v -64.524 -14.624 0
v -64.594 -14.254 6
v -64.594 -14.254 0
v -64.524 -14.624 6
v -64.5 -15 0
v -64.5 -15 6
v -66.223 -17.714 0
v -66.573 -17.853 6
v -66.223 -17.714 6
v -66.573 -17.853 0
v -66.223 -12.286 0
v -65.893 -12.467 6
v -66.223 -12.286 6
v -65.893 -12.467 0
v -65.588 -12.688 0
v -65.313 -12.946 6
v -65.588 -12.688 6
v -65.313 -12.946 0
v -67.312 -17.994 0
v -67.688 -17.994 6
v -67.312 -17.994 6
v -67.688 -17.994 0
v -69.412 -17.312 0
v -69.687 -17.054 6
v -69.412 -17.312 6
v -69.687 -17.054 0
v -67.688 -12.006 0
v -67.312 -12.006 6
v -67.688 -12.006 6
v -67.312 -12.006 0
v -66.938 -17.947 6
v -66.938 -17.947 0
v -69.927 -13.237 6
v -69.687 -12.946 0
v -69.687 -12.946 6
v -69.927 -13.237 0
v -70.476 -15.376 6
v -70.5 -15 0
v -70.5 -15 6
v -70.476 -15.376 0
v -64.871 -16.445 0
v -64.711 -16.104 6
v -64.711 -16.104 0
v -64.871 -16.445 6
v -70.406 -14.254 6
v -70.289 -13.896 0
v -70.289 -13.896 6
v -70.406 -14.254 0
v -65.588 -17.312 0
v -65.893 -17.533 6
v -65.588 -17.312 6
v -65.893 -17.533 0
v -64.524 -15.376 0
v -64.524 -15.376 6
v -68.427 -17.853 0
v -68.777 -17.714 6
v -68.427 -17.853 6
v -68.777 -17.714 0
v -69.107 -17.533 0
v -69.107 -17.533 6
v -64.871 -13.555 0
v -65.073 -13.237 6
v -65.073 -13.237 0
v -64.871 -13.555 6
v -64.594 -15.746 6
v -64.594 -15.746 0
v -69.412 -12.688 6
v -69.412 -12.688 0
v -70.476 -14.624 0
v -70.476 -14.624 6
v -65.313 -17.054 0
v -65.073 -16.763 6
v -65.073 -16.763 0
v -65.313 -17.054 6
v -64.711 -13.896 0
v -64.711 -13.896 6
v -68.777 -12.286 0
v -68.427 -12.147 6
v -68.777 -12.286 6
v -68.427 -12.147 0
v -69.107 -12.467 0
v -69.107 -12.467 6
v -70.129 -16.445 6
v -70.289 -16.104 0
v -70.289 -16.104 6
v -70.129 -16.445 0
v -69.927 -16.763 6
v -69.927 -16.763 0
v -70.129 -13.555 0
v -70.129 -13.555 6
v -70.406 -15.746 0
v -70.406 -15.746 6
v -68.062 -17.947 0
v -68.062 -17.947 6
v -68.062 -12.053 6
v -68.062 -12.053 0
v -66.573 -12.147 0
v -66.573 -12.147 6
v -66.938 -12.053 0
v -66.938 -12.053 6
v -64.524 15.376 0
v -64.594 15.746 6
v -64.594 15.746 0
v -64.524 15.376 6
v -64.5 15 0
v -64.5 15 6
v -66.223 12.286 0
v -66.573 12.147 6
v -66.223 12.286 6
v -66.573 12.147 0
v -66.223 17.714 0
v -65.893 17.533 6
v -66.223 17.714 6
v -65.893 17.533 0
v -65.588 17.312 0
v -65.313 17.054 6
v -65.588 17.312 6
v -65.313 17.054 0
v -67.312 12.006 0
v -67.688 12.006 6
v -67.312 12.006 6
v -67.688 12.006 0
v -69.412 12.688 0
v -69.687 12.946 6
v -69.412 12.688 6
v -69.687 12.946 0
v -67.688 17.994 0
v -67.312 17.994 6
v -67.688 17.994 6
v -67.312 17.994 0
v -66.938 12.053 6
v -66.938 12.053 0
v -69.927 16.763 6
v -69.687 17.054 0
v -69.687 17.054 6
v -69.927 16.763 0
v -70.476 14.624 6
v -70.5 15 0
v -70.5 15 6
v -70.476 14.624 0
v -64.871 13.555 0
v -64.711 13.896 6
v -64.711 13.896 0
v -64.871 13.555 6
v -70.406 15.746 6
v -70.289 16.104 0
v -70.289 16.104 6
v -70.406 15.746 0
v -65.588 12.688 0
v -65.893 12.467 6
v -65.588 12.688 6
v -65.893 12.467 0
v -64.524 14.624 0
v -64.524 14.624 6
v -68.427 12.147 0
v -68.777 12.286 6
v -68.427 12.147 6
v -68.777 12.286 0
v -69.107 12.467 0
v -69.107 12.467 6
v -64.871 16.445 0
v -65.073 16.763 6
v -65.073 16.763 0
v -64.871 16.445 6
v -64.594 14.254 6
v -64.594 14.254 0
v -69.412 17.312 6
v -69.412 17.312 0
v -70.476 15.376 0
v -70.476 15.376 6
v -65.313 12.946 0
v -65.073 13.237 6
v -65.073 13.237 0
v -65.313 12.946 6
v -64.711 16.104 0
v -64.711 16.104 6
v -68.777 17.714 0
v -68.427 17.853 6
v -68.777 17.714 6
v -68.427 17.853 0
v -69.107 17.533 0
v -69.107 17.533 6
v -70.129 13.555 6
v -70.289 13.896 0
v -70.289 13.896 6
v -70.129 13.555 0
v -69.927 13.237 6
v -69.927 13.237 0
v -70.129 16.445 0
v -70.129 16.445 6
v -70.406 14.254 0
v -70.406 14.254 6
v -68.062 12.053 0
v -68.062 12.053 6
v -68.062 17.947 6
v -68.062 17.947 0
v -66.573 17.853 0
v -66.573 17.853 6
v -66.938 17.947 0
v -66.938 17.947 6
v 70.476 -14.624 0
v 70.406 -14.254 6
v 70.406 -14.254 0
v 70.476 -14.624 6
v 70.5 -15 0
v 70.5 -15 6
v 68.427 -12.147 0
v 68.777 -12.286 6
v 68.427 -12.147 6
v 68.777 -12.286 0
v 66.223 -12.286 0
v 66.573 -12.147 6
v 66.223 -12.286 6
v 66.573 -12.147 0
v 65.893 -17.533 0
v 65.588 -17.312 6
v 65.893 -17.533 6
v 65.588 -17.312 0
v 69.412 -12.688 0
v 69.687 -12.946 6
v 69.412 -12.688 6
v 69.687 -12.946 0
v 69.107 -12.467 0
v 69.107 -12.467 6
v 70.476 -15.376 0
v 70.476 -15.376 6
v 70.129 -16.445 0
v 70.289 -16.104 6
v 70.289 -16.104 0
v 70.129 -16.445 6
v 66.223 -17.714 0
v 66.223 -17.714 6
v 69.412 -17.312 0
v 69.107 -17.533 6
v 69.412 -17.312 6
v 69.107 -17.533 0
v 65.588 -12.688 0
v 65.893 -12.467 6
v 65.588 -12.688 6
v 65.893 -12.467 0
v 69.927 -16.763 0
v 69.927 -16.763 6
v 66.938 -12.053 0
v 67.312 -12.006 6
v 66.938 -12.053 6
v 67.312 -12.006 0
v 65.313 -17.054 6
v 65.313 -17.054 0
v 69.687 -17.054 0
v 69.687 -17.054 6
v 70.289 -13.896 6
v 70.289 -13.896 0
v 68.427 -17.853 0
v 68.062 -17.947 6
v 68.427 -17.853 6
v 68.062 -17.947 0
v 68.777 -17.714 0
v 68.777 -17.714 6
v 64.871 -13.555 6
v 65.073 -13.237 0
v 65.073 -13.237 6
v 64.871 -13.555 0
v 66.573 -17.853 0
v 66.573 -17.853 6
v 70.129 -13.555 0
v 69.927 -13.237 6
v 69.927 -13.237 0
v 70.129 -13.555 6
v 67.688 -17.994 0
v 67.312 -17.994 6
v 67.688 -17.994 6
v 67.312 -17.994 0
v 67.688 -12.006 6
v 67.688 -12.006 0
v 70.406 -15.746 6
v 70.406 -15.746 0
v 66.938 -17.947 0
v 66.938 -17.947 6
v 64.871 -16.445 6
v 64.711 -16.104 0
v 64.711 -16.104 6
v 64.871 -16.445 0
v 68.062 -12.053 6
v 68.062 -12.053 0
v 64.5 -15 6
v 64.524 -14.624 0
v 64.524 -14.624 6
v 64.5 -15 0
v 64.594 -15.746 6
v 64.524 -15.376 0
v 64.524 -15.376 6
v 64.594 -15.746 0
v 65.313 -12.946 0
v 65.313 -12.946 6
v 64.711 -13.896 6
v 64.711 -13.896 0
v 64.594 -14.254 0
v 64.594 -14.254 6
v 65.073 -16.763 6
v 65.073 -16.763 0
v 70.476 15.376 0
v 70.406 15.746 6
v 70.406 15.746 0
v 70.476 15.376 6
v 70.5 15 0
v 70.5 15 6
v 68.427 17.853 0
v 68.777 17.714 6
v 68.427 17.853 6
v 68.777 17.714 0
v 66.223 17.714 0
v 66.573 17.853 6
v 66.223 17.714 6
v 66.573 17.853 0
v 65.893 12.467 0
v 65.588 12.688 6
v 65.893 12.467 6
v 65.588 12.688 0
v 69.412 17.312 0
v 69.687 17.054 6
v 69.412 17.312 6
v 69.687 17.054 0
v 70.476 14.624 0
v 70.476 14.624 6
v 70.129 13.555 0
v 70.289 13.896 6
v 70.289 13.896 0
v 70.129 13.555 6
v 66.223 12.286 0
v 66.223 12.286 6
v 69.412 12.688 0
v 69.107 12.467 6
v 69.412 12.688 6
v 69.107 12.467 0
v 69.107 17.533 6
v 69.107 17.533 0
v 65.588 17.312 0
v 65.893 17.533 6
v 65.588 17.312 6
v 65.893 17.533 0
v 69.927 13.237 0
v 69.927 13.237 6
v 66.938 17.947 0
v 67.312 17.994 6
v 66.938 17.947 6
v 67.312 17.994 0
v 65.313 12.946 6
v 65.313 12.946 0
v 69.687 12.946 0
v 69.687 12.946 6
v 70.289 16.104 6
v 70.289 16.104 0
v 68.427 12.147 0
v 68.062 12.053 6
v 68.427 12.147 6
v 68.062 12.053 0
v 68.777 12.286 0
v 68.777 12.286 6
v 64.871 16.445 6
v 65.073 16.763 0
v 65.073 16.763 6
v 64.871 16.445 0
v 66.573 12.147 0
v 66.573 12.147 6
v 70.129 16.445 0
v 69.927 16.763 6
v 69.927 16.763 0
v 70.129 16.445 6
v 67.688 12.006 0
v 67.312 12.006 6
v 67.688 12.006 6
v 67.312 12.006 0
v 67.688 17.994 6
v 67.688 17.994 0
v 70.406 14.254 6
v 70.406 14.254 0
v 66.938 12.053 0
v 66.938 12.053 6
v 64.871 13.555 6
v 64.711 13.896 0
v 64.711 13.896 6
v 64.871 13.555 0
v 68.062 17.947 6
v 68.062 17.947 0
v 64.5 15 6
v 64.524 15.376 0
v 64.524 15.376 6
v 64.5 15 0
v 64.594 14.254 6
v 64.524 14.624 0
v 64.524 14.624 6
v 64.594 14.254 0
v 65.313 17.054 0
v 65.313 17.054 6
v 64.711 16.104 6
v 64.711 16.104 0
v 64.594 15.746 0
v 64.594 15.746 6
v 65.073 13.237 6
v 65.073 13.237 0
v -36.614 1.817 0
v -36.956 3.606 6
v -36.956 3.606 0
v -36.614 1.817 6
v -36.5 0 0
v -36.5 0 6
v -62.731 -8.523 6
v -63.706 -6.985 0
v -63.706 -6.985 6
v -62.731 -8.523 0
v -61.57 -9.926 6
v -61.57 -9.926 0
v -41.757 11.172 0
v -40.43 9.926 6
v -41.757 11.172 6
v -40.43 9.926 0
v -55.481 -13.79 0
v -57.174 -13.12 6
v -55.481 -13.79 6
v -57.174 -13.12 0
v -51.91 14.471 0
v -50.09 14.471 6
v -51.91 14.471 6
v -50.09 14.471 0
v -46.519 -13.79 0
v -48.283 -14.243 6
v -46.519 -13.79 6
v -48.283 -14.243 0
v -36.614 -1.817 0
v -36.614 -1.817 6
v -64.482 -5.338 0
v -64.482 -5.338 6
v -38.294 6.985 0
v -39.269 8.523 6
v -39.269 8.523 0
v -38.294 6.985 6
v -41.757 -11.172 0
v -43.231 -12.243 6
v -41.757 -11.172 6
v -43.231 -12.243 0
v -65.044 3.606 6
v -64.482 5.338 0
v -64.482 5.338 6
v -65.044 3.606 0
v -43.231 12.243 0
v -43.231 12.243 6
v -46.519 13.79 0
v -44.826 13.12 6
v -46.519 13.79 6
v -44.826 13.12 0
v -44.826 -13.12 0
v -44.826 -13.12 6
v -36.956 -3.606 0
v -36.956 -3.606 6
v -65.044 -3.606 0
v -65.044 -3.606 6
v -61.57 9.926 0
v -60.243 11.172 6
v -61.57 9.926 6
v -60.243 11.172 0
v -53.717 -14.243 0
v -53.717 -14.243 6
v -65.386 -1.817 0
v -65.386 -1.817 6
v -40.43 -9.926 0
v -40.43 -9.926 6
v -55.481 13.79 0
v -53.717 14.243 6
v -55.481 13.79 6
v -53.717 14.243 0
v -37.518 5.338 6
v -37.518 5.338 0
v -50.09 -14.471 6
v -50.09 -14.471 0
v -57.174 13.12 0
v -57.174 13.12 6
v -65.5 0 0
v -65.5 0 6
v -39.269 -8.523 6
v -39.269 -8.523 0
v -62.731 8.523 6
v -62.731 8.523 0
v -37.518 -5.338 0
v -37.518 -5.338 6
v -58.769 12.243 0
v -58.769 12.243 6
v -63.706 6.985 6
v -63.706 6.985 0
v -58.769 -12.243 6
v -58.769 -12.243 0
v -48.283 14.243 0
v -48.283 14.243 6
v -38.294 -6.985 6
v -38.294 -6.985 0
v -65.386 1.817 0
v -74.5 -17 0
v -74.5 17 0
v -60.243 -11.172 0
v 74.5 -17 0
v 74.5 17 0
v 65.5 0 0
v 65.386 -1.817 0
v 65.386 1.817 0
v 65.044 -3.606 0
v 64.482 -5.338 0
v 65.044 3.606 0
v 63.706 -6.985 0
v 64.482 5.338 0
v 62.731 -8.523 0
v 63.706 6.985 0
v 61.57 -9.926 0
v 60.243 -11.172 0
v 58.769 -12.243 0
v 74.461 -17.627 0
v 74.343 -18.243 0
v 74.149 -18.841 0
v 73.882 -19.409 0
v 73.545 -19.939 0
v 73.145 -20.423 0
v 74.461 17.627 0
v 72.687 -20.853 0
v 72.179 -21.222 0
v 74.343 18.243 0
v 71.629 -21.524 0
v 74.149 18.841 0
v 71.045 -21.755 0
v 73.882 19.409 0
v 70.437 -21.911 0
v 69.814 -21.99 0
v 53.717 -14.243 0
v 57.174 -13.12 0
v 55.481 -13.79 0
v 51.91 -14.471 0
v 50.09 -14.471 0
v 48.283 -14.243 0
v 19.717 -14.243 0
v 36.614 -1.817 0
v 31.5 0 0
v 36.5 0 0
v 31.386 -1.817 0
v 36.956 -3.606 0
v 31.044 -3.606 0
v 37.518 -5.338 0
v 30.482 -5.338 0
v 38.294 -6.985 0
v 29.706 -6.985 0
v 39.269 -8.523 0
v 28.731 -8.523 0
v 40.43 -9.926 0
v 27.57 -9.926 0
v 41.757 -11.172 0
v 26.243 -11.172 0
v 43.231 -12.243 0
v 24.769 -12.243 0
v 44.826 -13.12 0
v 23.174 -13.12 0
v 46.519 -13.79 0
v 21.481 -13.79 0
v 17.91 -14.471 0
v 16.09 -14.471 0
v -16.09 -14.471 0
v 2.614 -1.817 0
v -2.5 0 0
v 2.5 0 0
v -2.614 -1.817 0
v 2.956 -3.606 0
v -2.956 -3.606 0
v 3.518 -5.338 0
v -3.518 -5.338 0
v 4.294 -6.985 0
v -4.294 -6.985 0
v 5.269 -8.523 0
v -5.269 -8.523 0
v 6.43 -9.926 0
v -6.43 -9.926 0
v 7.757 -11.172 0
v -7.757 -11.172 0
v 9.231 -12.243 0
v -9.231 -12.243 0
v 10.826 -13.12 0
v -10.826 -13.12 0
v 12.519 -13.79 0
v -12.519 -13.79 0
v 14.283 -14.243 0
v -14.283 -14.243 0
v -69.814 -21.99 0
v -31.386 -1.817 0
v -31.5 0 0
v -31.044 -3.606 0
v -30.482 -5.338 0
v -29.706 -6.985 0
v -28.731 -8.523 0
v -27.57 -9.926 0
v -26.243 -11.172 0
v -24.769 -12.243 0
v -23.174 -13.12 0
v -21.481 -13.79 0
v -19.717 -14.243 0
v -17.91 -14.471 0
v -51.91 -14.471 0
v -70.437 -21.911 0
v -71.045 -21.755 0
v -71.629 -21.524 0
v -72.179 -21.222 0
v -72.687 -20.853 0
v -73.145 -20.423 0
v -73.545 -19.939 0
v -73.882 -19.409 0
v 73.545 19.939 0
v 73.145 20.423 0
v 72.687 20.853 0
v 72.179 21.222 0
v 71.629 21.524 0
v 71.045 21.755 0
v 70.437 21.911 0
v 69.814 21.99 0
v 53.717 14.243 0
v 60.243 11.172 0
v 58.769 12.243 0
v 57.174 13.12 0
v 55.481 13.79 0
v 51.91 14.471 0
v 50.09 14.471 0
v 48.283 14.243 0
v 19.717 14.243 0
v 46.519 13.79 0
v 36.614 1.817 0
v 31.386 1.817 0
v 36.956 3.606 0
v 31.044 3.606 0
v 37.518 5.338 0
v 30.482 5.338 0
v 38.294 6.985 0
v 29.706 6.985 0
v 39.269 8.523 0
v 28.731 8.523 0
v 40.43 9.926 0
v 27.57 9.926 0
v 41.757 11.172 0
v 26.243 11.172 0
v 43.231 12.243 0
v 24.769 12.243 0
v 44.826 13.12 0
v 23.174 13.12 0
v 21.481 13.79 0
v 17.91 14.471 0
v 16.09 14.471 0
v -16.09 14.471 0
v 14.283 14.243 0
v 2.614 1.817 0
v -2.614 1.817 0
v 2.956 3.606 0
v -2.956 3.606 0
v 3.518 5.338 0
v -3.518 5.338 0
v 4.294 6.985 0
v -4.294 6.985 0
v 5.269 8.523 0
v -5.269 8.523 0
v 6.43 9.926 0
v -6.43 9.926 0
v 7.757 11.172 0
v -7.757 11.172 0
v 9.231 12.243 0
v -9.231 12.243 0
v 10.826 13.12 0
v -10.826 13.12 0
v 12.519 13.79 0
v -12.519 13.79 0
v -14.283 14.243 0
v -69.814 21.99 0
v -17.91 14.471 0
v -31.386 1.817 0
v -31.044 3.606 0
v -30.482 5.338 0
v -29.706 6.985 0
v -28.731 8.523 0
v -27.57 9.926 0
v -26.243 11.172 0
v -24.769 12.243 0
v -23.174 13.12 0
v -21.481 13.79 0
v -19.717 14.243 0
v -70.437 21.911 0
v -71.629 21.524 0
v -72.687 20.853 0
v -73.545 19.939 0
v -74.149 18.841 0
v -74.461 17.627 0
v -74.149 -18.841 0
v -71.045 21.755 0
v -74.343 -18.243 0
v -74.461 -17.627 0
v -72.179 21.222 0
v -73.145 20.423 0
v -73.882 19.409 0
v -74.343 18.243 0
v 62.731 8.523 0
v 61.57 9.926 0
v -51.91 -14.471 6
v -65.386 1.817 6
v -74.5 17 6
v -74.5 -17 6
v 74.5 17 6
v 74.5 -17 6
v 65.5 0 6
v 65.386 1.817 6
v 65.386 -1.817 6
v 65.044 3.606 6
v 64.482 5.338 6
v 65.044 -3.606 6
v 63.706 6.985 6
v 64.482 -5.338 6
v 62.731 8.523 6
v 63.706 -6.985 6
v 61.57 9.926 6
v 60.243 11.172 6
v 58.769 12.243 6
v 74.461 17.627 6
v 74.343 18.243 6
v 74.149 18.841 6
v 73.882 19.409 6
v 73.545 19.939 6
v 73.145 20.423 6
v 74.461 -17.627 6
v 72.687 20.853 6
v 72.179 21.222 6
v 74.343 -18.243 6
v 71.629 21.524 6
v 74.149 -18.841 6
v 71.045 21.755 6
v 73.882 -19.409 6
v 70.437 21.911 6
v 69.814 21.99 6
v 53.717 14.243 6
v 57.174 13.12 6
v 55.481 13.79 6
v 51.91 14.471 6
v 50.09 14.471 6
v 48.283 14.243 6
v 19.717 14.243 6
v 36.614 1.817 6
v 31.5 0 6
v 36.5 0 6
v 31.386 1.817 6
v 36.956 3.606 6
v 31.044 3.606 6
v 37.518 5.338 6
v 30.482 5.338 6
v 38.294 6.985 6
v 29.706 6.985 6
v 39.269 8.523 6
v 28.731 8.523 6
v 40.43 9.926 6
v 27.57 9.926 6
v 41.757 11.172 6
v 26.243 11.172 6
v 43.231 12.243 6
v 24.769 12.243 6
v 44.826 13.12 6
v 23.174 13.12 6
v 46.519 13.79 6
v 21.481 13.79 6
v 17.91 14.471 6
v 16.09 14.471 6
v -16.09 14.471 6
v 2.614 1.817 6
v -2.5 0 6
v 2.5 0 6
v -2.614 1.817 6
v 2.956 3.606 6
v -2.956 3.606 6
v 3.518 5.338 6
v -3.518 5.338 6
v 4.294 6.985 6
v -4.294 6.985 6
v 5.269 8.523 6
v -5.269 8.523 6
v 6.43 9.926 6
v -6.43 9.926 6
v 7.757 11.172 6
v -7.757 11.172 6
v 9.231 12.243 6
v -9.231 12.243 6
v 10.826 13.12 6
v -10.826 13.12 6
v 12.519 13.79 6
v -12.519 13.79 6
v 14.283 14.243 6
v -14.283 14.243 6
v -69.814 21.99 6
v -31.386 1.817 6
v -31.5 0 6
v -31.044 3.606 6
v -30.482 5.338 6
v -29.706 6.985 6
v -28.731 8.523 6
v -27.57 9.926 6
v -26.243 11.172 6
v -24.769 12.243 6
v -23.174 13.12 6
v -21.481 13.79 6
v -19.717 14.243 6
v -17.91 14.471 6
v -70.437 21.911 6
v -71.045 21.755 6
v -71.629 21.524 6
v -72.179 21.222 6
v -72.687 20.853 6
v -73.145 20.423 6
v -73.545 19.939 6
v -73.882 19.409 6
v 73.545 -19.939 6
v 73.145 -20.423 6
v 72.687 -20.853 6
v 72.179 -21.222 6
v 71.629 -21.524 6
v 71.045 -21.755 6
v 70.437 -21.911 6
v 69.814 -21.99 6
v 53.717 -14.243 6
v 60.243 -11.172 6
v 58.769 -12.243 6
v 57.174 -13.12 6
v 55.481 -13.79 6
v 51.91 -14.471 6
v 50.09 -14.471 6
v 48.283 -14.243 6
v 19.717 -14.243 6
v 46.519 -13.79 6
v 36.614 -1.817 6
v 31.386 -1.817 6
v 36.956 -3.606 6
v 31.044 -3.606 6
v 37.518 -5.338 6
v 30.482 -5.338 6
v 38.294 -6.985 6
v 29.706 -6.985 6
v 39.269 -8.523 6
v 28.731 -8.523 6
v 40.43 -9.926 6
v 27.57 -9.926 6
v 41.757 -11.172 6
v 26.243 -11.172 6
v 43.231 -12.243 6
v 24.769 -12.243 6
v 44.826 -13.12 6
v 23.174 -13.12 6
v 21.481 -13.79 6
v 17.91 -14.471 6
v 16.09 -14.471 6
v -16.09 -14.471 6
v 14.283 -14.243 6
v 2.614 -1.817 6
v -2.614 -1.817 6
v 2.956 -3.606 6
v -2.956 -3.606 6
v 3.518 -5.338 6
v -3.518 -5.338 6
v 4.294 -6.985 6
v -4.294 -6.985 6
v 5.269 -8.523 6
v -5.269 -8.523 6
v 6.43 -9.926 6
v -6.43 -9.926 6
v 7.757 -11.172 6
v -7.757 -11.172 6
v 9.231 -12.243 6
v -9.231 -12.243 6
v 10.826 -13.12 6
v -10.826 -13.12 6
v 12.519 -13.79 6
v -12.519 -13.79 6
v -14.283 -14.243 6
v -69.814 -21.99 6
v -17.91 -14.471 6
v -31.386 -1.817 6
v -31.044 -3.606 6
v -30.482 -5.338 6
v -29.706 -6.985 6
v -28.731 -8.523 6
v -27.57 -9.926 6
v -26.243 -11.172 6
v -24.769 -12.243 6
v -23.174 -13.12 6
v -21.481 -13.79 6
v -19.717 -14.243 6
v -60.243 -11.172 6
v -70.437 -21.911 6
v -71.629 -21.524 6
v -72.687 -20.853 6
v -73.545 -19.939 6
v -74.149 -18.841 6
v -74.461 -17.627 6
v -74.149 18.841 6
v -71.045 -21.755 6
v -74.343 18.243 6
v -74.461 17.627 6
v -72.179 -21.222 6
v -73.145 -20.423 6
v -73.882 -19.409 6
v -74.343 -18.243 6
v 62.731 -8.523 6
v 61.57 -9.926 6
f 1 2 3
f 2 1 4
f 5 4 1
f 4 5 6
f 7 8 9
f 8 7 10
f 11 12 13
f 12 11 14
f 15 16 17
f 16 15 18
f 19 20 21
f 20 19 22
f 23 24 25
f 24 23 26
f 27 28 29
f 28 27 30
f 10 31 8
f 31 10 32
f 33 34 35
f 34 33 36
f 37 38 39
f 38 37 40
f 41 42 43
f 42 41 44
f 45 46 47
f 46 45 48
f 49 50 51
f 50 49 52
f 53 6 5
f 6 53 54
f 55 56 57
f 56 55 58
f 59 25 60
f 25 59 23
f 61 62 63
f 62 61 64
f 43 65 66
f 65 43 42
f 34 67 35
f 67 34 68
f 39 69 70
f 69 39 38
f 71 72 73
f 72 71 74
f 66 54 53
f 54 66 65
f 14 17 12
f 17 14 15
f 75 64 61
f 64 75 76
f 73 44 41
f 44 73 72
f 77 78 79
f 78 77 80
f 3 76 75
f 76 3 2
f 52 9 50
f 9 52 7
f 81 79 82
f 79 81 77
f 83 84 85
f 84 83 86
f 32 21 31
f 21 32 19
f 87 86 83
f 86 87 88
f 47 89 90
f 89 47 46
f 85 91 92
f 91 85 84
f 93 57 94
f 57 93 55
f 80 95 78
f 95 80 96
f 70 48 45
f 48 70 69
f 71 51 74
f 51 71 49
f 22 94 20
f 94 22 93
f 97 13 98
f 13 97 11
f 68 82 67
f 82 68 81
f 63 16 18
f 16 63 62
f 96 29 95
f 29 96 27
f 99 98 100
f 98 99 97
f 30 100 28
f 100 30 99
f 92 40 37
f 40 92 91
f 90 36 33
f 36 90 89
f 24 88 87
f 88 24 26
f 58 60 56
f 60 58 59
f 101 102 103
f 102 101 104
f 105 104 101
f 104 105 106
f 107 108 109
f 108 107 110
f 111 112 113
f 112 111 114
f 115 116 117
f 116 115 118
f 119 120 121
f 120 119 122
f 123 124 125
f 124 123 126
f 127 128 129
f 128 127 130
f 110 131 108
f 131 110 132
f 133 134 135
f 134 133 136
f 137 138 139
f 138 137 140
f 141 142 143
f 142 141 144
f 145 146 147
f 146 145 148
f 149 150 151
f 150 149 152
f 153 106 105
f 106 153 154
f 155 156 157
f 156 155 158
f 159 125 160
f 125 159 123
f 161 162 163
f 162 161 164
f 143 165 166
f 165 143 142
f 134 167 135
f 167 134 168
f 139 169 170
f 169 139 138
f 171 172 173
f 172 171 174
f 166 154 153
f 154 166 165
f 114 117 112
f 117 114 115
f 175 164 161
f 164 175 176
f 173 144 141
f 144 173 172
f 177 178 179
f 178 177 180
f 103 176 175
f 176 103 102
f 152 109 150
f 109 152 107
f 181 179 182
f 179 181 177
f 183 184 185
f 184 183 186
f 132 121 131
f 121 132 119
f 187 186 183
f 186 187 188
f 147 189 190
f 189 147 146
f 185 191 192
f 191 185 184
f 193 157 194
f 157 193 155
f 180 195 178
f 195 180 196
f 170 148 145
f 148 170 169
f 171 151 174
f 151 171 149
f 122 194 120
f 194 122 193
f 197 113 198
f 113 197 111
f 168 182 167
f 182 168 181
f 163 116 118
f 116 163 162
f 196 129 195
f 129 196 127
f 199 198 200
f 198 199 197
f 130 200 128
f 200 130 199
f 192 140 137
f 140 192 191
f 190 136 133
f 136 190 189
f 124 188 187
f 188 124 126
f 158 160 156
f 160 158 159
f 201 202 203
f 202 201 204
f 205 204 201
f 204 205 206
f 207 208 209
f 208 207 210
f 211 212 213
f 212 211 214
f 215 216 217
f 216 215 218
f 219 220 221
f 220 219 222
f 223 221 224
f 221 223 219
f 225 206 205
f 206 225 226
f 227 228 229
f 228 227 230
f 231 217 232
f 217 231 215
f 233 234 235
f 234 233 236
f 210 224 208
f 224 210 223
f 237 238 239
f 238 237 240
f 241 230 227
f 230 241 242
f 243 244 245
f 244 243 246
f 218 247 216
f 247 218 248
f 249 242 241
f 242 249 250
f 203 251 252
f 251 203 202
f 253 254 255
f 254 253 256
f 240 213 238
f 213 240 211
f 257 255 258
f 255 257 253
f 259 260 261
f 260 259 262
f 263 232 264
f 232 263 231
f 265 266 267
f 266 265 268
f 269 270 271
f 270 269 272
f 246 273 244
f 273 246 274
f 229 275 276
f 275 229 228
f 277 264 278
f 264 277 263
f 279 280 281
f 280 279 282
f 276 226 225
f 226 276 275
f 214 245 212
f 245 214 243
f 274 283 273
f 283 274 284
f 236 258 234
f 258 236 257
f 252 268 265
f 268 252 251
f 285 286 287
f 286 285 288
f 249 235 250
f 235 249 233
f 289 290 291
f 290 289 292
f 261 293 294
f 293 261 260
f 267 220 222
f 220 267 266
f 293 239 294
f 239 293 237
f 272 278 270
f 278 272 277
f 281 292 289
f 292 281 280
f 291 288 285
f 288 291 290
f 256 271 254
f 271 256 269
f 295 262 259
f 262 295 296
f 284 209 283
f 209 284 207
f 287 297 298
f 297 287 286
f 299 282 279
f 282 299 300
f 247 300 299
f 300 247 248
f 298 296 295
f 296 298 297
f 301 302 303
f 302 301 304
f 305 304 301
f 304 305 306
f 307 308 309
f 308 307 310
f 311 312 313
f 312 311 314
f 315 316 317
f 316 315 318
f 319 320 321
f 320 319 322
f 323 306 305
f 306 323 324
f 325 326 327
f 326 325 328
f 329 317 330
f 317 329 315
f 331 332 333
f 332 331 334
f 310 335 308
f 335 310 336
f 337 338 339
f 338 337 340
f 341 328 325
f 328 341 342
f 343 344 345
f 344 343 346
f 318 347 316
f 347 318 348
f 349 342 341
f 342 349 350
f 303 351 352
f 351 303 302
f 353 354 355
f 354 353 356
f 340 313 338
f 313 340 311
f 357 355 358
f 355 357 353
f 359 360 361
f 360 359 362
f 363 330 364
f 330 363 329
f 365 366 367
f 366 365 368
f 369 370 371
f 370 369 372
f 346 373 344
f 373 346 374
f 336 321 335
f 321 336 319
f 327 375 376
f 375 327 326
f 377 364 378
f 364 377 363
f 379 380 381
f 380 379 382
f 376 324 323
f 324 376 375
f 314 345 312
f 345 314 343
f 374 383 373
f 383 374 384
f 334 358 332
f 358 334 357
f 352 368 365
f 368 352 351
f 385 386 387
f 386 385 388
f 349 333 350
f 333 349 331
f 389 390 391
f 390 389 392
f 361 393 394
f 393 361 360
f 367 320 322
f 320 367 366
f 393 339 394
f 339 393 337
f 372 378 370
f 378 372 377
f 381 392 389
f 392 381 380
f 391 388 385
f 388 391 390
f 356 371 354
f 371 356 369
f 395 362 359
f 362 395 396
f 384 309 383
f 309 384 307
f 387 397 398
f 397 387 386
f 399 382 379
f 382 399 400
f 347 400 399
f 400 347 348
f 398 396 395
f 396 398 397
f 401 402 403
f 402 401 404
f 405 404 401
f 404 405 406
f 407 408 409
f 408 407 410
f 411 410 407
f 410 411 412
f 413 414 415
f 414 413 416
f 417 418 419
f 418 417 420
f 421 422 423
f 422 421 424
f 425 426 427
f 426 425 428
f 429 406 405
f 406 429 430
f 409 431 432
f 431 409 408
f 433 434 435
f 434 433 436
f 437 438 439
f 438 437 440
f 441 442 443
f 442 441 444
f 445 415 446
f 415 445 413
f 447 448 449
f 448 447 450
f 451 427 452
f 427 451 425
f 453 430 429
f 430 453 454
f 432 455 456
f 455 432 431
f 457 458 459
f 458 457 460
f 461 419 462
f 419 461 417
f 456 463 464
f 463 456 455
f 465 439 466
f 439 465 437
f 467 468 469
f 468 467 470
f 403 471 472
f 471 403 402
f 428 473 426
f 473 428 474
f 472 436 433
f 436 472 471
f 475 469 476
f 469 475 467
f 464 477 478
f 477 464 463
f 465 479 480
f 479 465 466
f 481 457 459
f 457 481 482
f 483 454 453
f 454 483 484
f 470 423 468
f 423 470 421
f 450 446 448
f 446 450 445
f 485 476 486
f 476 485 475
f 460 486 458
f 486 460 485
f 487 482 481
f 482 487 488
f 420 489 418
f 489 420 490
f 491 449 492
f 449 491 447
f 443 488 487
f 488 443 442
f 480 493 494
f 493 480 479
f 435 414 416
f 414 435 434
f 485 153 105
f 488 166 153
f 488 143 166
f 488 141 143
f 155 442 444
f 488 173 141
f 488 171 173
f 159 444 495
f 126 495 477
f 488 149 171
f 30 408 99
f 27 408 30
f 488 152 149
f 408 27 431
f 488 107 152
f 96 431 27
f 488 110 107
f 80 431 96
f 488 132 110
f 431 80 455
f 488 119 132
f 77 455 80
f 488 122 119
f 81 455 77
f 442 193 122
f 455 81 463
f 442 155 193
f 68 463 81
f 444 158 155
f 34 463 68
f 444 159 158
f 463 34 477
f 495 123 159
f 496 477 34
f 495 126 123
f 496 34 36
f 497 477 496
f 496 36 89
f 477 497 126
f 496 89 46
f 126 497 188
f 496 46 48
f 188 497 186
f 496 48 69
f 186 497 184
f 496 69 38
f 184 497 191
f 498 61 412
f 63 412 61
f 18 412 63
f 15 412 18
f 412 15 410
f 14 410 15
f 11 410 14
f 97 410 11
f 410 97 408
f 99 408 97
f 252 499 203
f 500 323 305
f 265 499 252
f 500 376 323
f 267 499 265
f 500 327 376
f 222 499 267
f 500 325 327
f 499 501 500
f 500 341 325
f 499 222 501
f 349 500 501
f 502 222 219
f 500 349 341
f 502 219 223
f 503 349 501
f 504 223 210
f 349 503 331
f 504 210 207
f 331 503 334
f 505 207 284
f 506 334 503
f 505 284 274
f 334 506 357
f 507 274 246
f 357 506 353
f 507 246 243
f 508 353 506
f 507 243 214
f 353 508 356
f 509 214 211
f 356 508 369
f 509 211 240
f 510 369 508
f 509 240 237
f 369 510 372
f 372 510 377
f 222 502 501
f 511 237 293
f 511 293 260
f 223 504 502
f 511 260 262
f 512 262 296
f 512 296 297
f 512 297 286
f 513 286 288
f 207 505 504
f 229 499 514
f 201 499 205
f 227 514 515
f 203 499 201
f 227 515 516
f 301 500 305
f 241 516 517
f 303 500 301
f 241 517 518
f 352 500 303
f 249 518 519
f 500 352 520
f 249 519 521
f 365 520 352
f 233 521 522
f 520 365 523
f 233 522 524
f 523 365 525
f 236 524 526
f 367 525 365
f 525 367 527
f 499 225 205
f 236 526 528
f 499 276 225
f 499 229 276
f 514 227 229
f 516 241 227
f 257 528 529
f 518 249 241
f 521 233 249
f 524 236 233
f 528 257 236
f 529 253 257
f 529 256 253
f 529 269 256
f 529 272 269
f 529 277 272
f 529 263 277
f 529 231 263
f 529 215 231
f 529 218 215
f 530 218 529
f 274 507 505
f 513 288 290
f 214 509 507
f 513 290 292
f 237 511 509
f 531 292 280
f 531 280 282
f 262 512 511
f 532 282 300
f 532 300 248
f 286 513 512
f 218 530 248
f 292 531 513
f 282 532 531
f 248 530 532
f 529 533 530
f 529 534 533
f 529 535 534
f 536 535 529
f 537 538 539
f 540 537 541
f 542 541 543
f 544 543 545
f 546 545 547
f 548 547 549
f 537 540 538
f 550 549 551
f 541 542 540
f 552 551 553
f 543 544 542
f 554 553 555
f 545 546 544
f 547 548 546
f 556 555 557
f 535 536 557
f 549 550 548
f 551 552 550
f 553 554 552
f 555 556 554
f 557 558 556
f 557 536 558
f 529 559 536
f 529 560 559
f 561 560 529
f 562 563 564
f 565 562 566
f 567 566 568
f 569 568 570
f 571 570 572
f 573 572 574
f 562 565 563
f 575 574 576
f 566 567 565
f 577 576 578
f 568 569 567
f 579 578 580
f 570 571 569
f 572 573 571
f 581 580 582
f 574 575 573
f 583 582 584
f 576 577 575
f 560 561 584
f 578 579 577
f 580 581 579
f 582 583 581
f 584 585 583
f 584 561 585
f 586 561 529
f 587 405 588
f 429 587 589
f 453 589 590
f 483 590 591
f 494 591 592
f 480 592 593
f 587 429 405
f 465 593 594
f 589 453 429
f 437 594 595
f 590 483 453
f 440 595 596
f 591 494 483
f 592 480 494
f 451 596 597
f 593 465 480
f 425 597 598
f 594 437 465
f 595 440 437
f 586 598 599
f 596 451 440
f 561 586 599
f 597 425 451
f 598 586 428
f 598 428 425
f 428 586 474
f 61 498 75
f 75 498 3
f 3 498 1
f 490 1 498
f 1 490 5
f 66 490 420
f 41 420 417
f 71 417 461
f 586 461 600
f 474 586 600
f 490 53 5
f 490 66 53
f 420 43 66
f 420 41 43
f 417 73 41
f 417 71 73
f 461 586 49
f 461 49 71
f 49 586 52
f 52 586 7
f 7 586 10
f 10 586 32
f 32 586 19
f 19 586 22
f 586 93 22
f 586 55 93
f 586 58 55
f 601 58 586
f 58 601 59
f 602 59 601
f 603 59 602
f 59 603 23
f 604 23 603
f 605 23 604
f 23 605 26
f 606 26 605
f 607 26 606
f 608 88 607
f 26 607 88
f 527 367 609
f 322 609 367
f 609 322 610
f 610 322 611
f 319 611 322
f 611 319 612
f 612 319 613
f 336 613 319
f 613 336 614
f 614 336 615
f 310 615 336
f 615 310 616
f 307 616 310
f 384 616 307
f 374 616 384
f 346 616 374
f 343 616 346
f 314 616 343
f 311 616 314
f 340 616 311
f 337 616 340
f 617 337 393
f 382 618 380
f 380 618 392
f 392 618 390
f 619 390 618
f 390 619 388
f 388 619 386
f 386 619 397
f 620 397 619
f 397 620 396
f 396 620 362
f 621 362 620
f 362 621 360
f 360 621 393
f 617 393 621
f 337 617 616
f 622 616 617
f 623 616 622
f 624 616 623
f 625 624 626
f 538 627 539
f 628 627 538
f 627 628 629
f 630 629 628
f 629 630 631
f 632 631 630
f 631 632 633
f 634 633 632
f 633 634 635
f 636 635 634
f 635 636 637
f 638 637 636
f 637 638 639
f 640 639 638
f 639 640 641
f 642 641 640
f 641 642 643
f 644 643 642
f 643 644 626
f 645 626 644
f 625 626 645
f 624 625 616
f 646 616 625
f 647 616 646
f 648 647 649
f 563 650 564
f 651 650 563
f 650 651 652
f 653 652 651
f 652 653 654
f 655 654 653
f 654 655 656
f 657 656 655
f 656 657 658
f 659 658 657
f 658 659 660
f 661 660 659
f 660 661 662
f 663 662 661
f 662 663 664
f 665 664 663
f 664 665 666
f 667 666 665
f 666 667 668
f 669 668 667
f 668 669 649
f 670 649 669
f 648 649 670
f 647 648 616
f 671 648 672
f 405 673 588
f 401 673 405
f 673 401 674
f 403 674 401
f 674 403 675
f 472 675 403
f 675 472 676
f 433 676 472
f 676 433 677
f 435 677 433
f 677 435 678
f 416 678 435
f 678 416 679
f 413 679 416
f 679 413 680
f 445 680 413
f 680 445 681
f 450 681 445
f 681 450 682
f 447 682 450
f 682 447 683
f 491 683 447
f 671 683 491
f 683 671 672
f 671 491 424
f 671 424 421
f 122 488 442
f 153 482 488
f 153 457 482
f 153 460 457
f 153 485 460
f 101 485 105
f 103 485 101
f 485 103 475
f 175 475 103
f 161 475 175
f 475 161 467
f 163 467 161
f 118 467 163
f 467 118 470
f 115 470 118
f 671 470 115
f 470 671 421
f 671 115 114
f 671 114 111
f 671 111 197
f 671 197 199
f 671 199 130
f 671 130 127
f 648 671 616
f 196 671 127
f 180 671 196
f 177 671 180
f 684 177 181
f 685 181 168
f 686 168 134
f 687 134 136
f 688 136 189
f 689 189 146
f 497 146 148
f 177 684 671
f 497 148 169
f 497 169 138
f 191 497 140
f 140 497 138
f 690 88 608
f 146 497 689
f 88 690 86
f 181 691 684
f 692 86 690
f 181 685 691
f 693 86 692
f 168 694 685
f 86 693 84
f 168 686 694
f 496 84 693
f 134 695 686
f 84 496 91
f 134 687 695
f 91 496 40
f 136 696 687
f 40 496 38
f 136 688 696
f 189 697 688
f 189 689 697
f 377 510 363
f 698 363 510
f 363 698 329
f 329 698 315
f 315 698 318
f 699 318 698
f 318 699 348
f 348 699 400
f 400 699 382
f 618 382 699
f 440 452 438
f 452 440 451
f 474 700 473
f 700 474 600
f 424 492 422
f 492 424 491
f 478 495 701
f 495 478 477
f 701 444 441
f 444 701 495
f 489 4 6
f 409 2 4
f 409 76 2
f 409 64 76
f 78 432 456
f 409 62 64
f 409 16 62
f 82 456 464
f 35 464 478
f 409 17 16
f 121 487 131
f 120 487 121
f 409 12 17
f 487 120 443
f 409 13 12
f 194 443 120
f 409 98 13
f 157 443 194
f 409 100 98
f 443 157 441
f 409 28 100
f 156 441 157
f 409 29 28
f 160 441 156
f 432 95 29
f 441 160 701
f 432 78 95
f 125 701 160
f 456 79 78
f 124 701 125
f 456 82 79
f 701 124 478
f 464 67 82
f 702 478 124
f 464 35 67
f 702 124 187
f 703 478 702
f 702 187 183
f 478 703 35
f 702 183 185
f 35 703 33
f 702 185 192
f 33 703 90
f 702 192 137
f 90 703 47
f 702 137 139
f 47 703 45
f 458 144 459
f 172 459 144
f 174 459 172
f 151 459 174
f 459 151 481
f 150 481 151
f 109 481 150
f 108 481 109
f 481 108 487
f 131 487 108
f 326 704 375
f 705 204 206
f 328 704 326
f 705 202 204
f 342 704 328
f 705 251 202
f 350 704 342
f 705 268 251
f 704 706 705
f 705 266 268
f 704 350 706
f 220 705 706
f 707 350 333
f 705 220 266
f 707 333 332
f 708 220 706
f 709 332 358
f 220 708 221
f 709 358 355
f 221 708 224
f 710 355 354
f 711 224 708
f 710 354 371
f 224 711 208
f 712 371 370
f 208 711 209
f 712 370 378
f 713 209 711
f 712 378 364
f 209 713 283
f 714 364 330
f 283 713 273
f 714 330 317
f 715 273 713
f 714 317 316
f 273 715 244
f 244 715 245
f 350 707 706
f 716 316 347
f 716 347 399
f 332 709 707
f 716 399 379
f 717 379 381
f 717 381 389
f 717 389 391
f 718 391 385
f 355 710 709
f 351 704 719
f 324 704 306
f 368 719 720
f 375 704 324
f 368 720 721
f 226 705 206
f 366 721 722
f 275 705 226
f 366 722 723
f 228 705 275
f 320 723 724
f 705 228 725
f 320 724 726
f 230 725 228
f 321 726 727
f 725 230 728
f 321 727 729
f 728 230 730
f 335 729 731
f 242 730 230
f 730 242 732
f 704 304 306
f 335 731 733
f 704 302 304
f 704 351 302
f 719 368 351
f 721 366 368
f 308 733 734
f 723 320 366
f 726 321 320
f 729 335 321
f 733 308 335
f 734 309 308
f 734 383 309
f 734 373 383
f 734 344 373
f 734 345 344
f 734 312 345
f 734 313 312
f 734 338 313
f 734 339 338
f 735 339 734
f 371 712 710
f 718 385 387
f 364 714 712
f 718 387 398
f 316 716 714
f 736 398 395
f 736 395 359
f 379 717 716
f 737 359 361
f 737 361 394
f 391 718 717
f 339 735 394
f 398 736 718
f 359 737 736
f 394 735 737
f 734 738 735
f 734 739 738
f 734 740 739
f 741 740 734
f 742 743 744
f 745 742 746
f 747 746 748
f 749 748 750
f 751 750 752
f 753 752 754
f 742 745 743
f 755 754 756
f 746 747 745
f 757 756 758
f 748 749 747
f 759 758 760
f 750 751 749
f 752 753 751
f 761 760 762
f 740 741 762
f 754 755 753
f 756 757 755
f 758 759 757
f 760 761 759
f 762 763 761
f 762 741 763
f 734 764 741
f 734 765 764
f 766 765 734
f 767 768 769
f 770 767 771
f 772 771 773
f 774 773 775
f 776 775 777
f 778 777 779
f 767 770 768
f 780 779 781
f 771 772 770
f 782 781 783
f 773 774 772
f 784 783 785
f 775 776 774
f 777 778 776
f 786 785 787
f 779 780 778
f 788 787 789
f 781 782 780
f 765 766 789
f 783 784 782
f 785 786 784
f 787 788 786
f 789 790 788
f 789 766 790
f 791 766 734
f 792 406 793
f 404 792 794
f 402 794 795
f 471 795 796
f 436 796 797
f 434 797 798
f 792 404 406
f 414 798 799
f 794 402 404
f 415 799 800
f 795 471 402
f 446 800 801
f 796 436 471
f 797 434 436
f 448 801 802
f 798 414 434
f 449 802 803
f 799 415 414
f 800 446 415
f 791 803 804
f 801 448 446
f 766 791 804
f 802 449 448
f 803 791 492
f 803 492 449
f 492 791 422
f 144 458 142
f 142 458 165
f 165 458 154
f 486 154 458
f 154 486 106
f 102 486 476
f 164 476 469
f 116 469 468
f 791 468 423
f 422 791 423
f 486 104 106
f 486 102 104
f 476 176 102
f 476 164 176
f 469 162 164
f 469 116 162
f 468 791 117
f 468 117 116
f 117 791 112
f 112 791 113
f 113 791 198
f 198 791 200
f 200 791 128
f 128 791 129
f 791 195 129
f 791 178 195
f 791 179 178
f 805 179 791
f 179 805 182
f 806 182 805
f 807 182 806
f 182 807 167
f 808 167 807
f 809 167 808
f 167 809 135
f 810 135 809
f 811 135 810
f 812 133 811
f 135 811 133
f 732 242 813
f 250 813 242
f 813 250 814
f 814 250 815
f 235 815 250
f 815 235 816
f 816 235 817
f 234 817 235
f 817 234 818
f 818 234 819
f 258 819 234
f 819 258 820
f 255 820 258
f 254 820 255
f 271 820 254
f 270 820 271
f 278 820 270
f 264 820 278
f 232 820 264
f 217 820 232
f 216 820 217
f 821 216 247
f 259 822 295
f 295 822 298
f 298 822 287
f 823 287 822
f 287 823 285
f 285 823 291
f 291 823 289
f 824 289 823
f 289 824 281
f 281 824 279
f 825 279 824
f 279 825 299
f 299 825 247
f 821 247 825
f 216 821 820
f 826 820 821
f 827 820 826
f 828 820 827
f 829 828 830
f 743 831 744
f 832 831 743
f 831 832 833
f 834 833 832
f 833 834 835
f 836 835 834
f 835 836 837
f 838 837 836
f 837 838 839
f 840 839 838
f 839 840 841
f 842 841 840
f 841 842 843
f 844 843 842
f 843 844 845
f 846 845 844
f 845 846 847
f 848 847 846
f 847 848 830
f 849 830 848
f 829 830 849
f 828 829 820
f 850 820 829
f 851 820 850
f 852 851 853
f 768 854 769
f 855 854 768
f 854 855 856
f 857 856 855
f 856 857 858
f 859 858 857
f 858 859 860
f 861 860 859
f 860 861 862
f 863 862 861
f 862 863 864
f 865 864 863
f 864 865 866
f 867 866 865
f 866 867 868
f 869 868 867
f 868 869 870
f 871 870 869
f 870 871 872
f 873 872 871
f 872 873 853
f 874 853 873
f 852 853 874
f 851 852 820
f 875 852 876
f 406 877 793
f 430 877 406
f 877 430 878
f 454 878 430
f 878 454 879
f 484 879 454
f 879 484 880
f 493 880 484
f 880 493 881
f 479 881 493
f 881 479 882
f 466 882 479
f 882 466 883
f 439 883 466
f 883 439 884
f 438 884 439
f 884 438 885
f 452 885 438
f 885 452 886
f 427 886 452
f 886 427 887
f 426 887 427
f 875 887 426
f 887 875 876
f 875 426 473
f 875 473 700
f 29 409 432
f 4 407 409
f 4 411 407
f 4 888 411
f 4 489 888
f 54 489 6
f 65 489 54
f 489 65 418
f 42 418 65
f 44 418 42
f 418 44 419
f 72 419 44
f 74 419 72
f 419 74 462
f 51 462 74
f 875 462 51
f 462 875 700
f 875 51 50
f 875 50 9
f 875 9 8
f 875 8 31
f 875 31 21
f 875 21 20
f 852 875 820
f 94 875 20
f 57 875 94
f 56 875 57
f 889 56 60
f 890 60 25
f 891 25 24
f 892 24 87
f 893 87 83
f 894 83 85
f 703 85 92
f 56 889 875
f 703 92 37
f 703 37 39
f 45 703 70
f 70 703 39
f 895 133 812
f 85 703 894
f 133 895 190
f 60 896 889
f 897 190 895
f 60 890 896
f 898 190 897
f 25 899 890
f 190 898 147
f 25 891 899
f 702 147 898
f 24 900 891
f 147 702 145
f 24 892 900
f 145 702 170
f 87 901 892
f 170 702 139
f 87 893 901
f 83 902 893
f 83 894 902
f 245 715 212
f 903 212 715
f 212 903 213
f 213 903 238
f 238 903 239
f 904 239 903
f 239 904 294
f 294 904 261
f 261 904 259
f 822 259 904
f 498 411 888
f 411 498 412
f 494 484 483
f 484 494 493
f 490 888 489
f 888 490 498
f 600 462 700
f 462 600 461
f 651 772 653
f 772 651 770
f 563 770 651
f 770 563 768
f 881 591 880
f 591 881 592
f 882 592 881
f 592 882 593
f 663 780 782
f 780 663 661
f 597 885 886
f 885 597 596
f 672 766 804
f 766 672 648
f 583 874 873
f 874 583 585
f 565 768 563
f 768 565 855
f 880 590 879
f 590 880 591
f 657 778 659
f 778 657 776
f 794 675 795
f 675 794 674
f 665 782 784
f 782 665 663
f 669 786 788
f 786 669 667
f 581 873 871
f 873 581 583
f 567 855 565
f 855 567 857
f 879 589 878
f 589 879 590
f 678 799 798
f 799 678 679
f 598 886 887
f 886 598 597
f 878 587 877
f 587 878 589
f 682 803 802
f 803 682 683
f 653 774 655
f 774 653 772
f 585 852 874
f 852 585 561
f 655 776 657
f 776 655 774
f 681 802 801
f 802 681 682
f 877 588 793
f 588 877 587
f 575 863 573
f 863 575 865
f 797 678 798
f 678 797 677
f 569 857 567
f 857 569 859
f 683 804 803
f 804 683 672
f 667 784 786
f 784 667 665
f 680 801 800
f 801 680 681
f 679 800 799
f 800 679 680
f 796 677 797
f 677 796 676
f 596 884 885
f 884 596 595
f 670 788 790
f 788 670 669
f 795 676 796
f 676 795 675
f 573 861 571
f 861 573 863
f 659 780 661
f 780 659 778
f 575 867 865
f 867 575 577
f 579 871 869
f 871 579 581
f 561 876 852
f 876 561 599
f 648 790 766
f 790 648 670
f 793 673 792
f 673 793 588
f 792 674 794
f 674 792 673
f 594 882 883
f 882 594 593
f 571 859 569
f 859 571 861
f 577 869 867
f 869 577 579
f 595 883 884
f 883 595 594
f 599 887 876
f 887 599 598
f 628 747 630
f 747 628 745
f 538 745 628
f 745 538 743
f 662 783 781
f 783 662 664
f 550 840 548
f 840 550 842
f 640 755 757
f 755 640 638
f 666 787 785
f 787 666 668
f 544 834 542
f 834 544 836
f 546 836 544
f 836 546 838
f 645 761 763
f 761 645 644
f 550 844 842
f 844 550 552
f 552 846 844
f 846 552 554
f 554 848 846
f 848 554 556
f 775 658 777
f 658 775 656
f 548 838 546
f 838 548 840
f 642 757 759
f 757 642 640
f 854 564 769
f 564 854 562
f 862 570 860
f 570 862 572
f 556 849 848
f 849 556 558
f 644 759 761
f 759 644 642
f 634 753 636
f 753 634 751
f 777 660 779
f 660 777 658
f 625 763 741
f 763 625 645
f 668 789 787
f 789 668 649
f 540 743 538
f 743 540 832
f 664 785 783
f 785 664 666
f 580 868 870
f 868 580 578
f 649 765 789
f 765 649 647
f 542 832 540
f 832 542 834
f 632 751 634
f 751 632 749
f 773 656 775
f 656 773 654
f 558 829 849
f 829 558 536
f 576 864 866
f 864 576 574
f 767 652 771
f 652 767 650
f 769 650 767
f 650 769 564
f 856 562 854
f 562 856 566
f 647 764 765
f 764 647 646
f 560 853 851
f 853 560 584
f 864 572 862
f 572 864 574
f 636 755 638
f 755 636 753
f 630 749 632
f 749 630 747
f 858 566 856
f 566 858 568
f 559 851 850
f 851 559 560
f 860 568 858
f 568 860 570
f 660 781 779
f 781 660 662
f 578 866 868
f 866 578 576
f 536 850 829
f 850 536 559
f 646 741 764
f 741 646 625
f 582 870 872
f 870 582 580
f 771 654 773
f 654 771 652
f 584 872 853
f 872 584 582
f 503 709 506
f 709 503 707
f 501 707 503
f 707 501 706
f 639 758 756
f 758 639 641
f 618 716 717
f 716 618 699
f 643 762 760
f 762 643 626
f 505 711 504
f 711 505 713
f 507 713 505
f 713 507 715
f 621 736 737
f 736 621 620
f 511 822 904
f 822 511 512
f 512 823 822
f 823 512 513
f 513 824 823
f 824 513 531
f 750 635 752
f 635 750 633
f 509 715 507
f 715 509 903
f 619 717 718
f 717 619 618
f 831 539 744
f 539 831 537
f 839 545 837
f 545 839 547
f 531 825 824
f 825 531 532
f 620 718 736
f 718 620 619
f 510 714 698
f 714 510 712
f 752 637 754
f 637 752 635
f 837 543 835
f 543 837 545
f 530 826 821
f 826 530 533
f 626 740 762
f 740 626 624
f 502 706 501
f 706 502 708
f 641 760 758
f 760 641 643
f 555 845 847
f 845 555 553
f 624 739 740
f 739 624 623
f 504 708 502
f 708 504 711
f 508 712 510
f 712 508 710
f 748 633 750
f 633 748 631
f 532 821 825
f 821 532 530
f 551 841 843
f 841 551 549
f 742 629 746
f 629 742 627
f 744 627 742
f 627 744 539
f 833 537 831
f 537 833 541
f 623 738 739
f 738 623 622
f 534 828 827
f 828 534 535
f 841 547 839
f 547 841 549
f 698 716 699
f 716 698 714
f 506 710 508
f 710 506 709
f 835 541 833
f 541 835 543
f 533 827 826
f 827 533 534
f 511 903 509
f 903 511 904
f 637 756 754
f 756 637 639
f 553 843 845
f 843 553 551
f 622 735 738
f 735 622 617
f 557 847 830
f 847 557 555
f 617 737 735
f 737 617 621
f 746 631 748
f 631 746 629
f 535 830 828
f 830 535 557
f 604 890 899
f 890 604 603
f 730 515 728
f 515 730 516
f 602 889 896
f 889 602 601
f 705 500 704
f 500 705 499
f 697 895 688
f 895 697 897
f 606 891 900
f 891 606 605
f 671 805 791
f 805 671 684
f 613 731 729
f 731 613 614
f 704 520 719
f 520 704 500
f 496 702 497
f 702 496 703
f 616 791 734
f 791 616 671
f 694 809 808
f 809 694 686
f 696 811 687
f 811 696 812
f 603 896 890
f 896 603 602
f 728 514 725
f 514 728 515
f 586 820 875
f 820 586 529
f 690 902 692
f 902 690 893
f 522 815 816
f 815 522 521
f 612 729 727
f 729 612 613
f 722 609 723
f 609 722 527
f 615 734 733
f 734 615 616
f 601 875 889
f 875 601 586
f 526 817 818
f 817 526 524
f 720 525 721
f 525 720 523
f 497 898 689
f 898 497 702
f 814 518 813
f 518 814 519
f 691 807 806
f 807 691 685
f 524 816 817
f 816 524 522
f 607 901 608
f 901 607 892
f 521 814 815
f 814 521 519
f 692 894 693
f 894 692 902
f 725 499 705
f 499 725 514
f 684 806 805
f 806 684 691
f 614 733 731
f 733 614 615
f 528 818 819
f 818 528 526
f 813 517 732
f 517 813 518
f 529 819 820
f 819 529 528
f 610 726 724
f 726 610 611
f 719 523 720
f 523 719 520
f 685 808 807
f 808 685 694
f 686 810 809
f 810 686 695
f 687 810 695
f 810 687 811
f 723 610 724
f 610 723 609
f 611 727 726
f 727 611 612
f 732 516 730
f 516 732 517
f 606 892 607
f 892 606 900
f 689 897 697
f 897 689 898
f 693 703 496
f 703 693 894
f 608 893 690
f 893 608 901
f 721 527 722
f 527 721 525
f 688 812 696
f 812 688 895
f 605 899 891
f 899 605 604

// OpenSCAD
$fn = 50;


difference() {
	union() {
		hull() {
			translate(v = [-69.5000000000, 17.0000000000, 0]) {
				cylinder(h = 6, r = 5);
			}
			translate(v = [69.5000000000, 17.0000000000, 0]) {
				cylinder(h = 6, r = 5);
			}
			translate(v = [-69.5000000000, -17.0000000000, 0]) {
				cylinder(h = 6, r = 5);
			}
			translate(v = [69.5000000000, -17.0000000000, 0]) {
				cylinder(h = 6, r = 5);
			}
		}
	}
	union() {
		#translate(v = [-67.5000000000, -15.0000000000, -100.0000000000]) {
			cylinder(h = 200, r = 3.0000000000);
		}
		#translate(v = [-67.5000000000, 15.0000000000, -100.0000000000]) {
			cylinder(h = 200, r = 3.0000000000);
		}
		#translate(v = [67.5000000000, -15.0000000000, -100.0000000000]) {
			cylinder(h = 200, r = 3.0000000000);
		}
		#translate(v = [67.5000000000, 15.0000000000, -100.0000000000]) {
			cylinder(h = 200, r = 3.0000000000);
		}
		#translate(v = [-51.0000000000, 0, 0]) {
			cylinder(h = 6, r = 14.5000000000);
		}
		#translate(v = [-17.0000000000, 0, 0]) {
			cylinder(h = 6, r = 14.5000000000);
		}
		#translate(v = [17.0000000000, 0, 0]) {
			cylinder(h = 6, r = 14.5000000000);
		}
		#translate(v = [51.0000000000, 0, 0]) {
			cylinder(h = 6, r = 14.5000000000);
		}
	}
}
